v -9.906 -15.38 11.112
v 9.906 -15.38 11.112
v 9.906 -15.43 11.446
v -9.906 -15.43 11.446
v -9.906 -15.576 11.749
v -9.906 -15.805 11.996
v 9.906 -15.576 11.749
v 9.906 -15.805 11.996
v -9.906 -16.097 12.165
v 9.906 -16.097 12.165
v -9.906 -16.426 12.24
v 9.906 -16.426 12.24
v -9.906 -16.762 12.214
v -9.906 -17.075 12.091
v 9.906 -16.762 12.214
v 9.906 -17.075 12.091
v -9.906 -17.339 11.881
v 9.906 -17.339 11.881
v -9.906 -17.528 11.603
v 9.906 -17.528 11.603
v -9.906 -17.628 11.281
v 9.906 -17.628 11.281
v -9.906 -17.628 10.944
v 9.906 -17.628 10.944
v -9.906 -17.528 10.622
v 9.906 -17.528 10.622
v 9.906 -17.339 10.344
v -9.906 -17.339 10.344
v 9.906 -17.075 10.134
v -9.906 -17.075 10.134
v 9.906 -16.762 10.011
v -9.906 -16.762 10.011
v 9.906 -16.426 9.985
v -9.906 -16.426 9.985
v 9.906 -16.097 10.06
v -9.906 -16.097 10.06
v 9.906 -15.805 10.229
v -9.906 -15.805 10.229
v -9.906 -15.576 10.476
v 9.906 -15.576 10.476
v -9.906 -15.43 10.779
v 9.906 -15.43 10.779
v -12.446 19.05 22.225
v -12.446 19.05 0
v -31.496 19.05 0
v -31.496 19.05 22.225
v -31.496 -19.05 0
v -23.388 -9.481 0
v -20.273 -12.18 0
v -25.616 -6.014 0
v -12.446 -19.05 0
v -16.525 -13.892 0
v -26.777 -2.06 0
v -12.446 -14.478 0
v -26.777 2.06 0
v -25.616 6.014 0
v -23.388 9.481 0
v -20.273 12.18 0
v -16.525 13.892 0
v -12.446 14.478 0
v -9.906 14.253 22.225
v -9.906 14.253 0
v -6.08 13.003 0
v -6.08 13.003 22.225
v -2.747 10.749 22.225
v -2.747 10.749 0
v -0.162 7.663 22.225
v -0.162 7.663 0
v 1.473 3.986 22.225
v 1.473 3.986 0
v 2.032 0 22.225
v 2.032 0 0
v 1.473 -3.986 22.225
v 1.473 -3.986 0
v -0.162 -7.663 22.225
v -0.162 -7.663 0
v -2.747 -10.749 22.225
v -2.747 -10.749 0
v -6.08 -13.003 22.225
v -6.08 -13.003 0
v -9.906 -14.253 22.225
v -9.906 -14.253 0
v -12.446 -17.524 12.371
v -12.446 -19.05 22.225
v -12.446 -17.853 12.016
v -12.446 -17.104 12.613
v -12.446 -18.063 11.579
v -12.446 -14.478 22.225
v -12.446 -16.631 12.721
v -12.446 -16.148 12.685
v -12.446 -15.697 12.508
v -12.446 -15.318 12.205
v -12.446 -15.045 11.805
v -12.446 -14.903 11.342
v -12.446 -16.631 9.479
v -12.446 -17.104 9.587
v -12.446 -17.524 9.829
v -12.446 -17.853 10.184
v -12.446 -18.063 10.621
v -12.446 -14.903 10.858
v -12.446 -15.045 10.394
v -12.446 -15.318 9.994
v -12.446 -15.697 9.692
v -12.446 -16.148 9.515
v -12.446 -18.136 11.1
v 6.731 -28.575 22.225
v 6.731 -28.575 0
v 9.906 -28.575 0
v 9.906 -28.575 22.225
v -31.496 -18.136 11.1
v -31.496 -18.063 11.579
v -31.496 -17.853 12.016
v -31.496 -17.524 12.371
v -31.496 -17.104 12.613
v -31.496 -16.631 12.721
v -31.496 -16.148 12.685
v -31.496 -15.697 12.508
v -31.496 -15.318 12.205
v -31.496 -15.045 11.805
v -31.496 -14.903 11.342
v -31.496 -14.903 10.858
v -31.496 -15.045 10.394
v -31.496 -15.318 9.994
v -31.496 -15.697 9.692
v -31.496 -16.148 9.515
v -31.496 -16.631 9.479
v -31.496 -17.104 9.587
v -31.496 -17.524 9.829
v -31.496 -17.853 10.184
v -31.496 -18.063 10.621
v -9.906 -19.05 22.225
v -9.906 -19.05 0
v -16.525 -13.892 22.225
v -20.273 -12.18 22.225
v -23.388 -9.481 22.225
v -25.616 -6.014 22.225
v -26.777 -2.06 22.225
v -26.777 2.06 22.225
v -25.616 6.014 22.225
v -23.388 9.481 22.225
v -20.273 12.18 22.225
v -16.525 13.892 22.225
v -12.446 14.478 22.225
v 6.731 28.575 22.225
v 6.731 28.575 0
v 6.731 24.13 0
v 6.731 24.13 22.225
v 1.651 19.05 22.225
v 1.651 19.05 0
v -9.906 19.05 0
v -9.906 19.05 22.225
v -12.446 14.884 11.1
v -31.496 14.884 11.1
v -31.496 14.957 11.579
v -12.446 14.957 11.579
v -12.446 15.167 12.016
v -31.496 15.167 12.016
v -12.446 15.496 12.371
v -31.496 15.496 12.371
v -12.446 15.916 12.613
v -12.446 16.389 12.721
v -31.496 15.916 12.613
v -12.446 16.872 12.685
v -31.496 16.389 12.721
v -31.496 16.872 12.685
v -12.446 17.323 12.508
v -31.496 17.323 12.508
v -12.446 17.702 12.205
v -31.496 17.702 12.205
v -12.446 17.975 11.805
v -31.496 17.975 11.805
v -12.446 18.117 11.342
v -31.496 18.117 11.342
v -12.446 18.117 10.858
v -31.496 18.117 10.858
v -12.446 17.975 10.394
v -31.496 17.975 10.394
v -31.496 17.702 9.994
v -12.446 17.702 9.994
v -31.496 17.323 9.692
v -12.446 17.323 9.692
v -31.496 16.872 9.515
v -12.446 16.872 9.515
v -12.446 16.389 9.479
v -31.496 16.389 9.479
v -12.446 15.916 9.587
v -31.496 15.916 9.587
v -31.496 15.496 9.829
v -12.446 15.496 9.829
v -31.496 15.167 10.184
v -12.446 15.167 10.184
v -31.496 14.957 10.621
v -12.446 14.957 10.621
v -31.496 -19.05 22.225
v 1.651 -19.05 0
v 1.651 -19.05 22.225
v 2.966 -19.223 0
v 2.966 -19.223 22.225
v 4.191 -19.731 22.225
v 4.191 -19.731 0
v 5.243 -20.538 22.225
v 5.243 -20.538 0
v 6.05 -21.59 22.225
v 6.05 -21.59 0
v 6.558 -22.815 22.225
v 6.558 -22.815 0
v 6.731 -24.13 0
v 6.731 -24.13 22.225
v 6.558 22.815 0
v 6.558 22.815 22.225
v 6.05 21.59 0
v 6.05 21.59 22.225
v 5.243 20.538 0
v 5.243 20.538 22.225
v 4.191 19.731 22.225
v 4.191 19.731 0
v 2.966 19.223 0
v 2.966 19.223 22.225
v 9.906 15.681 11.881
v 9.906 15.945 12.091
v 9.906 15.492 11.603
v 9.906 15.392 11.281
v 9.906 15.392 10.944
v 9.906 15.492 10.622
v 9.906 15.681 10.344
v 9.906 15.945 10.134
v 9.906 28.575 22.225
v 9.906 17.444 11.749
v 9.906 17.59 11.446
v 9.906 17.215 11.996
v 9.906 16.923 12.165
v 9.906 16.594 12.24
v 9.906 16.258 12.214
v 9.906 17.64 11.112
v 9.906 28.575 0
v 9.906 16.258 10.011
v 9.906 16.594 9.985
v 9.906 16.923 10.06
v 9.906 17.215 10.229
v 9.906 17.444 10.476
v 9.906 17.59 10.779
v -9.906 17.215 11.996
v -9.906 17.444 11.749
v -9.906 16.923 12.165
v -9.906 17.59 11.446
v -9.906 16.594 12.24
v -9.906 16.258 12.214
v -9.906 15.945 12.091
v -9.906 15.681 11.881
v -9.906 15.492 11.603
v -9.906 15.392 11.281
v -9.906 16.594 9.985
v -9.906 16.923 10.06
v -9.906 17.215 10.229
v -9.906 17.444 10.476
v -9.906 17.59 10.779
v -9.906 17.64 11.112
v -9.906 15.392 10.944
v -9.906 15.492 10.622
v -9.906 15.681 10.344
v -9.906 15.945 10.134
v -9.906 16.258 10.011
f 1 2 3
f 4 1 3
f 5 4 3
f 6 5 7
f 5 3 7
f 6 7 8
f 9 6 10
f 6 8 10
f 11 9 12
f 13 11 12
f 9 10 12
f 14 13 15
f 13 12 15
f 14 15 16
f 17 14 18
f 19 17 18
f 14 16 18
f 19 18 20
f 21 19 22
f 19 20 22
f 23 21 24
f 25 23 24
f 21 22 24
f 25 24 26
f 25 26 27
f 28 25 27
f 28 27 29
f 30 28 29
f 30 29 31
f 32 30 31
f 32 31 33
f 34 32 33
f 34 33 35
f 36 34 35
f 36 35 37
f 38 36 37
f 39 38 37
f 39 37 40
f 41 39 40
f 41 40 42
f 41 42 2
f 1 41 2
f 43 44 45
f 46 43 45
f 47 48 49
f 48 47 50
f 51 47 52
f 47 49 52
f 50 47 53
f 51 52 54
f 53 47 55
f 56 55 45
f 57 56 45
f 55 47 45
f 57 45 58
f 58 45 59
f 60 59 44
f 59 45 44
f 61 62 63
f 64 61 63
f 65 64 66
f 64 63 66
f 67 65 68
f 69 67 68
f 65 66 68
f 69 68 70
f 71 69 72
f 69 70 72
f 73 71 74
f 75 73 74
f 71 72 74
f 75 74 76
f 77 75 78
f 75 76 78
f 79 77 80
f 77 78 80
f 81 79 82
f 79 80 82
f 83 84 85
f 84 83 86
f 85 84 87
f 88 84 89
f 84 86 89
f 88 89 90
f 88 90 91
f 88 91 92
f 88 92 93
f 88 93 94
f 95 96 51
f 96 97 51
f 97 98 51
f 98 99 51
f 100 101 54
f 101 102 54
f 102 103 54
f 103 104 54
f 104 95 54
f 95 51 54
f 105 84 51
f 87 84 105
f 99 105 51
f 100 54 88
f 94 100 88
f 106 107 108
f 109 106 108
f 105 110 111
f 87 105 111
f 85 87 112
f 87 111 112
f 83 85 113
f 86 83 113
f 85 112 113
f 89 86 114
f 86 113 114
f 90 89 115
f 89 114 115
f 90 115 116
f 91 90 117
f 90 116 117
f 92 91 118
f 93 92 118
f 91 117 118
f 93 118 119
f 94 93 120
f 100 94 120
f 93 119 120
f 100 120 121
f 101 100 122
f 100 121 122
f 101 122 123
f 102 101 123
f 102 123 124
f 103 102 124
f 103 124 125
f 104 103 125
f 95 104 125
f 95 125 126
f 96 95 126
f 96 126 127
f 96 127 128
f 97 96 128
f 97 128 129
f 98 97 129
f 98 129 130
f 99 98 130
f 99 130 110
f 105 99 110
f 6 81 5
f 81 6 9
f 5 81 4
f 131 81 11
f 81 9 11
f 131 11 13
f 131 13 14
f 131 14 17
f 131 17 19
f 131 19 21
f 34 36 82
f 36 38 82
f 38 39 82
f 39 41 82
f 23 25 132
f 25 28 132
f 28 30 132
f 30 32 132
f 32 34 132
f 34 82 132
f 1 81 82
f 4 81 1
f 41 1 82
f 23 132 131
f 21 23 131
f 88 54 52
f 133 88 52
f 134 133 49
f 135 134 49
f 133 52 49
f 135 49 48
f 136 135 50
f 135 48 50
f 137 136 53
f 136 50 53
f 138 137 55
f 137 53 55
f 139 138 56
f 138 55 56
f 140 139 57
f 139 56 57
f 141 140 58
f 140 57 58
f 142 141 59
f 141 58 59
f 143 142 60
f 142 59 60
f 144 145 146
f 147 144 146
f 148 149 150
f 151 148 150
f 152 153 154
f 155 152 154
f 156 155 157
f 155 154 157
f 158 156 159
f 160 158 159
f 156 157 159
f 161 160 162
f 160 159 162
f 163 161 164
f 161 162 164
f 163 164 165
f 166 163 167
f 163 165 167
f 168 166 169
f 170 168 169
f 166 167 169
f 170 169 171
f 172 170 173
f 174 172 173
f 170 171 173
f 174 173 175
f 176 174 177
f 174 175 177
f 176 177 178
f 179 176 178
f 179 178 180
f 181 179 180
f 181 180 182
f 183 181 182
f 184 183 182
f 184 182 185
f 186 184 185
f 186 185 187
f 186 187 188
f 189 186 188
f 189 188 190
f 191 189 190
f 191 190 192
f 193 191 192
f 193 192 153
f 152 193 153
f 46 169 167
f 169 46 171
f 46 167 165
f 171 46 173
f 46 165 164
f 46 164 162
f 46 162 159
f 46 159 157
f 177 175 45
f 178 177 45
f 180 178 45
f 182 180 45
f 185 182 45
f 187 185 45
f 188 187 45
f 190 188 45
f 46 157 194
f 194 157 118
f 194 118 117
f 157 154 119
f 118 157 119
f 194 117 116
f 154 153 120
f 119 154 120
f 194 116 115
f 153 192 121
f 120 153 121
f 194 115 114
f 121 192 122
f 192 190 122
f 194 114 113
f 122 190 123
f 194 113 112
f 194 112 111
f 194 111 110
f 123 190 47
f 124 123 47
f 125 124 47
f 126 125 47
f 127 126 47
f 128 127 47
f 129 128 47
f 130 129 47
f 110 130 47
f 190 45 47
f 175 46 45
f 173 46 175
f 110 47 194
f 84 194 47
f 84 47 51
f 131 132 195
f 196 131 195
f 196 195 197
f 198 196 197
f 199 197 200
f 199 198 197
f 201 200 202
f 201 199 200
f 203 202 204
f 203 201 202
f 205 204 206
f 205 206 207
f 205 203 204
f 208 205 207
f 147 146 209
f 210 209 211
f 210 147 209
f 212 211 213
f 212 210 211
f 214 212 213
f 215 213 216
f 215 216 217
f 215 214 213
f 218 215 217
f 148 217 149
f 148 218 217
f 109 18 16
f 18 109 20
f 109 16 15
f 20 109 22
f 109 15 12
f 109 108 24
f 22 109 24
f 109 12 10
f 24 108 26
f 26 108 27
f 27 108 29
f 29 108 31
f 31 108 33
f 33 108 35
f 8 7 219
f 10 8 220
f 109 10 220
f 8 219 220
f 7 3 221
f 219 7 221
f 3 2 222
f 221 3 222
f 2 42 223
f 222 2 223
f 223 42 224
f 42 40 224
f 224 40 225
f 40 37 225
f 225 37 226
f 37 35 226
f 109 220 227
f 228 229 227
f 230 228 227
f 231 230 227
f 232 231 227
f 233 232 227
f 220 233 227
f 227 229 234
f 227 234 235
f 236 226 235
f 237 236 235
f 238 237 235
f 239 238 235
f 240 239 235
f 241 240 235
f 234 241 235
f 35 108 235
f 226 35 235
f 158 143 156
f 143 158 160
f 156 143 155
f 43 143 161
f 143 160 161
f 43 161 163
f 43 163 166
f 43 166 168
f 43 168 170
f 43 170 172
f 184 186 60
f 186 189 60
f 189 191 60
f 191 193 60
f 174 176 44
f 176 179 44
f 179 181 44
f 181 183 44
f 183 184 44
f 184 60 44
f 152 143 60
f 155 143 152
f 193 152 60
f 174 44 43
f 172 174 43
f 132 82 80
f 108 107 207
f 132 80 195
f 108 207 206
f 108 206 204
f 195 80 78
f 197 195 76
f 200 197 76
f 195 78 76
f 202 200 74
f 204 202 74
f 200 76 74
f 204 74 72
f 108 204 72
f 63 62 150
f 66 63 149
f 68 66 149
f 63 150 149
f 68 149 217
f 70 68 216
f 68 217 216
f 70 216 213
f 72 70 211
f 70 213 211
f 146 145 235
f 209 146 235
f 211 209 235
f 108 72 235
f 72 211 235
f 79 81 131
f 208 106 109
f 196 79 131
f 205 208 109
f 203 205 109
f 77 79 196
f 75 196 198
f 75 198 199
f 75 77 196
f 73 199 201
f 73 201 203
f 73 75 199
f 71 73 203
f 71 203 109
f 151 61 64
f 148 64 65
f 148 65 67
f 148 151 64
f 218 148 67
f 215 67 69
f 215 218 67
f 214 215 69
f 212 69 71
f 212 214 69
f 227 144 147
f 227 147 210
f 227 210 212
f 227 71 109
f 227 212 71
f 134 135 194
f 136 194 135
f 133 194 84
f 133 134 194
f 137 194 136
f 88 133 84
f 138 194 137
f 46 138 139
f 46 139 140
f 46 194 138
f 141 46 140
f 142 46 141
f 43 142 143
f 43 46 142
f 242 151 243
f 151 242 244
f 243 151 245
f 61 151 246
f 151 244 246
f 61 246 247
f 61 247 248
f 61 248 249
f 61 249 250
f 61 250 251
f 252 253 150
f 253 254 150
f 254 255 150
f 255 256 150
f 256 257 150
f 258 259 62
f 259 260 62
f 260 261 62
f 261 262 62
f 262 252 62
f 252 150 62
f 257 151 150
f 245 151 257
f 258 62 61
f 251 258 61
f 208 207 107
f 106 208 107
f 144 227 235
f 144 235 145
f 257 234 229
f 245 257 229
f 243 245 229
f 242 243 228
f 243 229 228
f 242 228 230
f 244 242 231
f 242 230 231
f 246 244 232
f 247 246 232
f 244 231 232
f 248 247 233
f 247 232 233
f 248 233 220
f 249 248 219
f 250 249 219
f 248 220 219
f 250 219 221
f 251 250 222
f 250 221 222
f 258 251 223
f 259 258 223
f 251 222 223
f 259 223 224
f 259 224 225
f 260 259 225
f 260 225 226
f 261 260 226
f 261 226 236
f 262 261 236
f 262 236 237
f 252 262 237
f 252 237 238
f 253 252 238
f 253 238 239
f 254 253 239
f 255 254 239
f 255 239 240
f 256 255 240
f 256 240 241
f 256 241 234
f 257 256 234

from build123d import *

# Parameters (mm, degrees)
F1_DEPTH = 22.225
F2_R     = 1.1303
F3_DEPTH = 41.403
F4_R     = 5.08
F5_R     = 1.6256
F6_DEPTH = 41.403


with BuildPart() as f1:
    # F0 (on Top) → F1 (new body)
    with BuildSketch(Plane.XY):
        with BuildLine():
            Line((-9.906, -19.05), (6.731, -19.05))
            Line((6.731, -19.05), (6.731, -28.575))
            Line((6.731, -28.575), (9.906, -28.575))
            Line((9.906, -28.575), (9.906, -19.05))
            Line((9.906, -19.05), (9.906, 19.05))
            Line((9.906, 19.05), (9.906, 28.575))
            Line((9.906, 28.575), (6.731, 28.575))
            Line((6.731, 28.575), (6.731, 19.05))
            Line((6.731, 19.05), (-9.906, 19.05))
            Line((-9.906, 19.05), (-9.906, 14.2534516521))
            ThreePointArc((-9.906, 14.2534516521), (2.032, 0), (-9.906, -14.2534516521))
            Line((-9.906, -14.2534516521), (-9.906, -19.05))
        make_face()
    extrude(amount=F1_DEPTH)


with BuildPart() as f1b:
    # F0 (on Top) → F1, piece 2 (new body)
    with BuildSketch(Plane.XY):
        with BuildLine():
            ThreePointArc((-12.446, -14.478), (-26.924, 0), (-12.446, 14.478))
            Line((-12.446, 14.478), (-12.446, 19.05))
            Line((-12.446, 19.05), (-31.496, 19.05))
            Line((-31.496, 19.05), (-31.496, -19.05))
            Line((-31.496, -19.05), (-12.446, -19.05))
            Line((-12.446, -19.05), (-12.446, -14.478))
        make_face()
    extrude(amount=F1_DEPTH)


with BuildPart() as f3_tool:
    # F2 (on face) → F3 (new body, through all)
    with BuildSketch(Plane.YZ.offset(9.906)):
        with Locations((16.51, 11.1125)):
            Circle(F2_R)
        with Locations((-16.51, 11.1125)):
            Circle(F2_R)
    extrude(amount=-F3_DEPTH)


with BuildPart() as f1_1:
    add(f1.part)

    # F3: cut by f3_tool
    add(f3_tool.part, mode=Mode.SUBTRACT)

    # F4
    f4_edges = [f1_1.edges().sort_by_distance(p)[0] for p in [
        (6.731, -19.05, 11.1125),
        (6.731, 19.05, 11.1125),
    ]]
    fillet(f4_edges, radius=F4_R)


with BuildPart() as f1b_1:
    add(f1b.part)

    # F3: cut by f3_tool
    add(f3_tool.part, mode=Mode.SUBTRACT)

    # F5 (on face) → F6 (cut, through all)
    with BuildSketch(Plane(origin=(-31.496, 0, 0), x_dir=(0, -1, 0), z_dir=(-1, 0, 0))):
        with Locations((16.51, 11.0998)):
            Circle(F5_R)
        with Locations((-16.51, 11.0998)):
            Circle(F5_R)
    extrude(amount=-F6_DEPTH, mode=Mode.SUBTRACT)


solid = Compound([f1_1.part, f1b_1.part])
